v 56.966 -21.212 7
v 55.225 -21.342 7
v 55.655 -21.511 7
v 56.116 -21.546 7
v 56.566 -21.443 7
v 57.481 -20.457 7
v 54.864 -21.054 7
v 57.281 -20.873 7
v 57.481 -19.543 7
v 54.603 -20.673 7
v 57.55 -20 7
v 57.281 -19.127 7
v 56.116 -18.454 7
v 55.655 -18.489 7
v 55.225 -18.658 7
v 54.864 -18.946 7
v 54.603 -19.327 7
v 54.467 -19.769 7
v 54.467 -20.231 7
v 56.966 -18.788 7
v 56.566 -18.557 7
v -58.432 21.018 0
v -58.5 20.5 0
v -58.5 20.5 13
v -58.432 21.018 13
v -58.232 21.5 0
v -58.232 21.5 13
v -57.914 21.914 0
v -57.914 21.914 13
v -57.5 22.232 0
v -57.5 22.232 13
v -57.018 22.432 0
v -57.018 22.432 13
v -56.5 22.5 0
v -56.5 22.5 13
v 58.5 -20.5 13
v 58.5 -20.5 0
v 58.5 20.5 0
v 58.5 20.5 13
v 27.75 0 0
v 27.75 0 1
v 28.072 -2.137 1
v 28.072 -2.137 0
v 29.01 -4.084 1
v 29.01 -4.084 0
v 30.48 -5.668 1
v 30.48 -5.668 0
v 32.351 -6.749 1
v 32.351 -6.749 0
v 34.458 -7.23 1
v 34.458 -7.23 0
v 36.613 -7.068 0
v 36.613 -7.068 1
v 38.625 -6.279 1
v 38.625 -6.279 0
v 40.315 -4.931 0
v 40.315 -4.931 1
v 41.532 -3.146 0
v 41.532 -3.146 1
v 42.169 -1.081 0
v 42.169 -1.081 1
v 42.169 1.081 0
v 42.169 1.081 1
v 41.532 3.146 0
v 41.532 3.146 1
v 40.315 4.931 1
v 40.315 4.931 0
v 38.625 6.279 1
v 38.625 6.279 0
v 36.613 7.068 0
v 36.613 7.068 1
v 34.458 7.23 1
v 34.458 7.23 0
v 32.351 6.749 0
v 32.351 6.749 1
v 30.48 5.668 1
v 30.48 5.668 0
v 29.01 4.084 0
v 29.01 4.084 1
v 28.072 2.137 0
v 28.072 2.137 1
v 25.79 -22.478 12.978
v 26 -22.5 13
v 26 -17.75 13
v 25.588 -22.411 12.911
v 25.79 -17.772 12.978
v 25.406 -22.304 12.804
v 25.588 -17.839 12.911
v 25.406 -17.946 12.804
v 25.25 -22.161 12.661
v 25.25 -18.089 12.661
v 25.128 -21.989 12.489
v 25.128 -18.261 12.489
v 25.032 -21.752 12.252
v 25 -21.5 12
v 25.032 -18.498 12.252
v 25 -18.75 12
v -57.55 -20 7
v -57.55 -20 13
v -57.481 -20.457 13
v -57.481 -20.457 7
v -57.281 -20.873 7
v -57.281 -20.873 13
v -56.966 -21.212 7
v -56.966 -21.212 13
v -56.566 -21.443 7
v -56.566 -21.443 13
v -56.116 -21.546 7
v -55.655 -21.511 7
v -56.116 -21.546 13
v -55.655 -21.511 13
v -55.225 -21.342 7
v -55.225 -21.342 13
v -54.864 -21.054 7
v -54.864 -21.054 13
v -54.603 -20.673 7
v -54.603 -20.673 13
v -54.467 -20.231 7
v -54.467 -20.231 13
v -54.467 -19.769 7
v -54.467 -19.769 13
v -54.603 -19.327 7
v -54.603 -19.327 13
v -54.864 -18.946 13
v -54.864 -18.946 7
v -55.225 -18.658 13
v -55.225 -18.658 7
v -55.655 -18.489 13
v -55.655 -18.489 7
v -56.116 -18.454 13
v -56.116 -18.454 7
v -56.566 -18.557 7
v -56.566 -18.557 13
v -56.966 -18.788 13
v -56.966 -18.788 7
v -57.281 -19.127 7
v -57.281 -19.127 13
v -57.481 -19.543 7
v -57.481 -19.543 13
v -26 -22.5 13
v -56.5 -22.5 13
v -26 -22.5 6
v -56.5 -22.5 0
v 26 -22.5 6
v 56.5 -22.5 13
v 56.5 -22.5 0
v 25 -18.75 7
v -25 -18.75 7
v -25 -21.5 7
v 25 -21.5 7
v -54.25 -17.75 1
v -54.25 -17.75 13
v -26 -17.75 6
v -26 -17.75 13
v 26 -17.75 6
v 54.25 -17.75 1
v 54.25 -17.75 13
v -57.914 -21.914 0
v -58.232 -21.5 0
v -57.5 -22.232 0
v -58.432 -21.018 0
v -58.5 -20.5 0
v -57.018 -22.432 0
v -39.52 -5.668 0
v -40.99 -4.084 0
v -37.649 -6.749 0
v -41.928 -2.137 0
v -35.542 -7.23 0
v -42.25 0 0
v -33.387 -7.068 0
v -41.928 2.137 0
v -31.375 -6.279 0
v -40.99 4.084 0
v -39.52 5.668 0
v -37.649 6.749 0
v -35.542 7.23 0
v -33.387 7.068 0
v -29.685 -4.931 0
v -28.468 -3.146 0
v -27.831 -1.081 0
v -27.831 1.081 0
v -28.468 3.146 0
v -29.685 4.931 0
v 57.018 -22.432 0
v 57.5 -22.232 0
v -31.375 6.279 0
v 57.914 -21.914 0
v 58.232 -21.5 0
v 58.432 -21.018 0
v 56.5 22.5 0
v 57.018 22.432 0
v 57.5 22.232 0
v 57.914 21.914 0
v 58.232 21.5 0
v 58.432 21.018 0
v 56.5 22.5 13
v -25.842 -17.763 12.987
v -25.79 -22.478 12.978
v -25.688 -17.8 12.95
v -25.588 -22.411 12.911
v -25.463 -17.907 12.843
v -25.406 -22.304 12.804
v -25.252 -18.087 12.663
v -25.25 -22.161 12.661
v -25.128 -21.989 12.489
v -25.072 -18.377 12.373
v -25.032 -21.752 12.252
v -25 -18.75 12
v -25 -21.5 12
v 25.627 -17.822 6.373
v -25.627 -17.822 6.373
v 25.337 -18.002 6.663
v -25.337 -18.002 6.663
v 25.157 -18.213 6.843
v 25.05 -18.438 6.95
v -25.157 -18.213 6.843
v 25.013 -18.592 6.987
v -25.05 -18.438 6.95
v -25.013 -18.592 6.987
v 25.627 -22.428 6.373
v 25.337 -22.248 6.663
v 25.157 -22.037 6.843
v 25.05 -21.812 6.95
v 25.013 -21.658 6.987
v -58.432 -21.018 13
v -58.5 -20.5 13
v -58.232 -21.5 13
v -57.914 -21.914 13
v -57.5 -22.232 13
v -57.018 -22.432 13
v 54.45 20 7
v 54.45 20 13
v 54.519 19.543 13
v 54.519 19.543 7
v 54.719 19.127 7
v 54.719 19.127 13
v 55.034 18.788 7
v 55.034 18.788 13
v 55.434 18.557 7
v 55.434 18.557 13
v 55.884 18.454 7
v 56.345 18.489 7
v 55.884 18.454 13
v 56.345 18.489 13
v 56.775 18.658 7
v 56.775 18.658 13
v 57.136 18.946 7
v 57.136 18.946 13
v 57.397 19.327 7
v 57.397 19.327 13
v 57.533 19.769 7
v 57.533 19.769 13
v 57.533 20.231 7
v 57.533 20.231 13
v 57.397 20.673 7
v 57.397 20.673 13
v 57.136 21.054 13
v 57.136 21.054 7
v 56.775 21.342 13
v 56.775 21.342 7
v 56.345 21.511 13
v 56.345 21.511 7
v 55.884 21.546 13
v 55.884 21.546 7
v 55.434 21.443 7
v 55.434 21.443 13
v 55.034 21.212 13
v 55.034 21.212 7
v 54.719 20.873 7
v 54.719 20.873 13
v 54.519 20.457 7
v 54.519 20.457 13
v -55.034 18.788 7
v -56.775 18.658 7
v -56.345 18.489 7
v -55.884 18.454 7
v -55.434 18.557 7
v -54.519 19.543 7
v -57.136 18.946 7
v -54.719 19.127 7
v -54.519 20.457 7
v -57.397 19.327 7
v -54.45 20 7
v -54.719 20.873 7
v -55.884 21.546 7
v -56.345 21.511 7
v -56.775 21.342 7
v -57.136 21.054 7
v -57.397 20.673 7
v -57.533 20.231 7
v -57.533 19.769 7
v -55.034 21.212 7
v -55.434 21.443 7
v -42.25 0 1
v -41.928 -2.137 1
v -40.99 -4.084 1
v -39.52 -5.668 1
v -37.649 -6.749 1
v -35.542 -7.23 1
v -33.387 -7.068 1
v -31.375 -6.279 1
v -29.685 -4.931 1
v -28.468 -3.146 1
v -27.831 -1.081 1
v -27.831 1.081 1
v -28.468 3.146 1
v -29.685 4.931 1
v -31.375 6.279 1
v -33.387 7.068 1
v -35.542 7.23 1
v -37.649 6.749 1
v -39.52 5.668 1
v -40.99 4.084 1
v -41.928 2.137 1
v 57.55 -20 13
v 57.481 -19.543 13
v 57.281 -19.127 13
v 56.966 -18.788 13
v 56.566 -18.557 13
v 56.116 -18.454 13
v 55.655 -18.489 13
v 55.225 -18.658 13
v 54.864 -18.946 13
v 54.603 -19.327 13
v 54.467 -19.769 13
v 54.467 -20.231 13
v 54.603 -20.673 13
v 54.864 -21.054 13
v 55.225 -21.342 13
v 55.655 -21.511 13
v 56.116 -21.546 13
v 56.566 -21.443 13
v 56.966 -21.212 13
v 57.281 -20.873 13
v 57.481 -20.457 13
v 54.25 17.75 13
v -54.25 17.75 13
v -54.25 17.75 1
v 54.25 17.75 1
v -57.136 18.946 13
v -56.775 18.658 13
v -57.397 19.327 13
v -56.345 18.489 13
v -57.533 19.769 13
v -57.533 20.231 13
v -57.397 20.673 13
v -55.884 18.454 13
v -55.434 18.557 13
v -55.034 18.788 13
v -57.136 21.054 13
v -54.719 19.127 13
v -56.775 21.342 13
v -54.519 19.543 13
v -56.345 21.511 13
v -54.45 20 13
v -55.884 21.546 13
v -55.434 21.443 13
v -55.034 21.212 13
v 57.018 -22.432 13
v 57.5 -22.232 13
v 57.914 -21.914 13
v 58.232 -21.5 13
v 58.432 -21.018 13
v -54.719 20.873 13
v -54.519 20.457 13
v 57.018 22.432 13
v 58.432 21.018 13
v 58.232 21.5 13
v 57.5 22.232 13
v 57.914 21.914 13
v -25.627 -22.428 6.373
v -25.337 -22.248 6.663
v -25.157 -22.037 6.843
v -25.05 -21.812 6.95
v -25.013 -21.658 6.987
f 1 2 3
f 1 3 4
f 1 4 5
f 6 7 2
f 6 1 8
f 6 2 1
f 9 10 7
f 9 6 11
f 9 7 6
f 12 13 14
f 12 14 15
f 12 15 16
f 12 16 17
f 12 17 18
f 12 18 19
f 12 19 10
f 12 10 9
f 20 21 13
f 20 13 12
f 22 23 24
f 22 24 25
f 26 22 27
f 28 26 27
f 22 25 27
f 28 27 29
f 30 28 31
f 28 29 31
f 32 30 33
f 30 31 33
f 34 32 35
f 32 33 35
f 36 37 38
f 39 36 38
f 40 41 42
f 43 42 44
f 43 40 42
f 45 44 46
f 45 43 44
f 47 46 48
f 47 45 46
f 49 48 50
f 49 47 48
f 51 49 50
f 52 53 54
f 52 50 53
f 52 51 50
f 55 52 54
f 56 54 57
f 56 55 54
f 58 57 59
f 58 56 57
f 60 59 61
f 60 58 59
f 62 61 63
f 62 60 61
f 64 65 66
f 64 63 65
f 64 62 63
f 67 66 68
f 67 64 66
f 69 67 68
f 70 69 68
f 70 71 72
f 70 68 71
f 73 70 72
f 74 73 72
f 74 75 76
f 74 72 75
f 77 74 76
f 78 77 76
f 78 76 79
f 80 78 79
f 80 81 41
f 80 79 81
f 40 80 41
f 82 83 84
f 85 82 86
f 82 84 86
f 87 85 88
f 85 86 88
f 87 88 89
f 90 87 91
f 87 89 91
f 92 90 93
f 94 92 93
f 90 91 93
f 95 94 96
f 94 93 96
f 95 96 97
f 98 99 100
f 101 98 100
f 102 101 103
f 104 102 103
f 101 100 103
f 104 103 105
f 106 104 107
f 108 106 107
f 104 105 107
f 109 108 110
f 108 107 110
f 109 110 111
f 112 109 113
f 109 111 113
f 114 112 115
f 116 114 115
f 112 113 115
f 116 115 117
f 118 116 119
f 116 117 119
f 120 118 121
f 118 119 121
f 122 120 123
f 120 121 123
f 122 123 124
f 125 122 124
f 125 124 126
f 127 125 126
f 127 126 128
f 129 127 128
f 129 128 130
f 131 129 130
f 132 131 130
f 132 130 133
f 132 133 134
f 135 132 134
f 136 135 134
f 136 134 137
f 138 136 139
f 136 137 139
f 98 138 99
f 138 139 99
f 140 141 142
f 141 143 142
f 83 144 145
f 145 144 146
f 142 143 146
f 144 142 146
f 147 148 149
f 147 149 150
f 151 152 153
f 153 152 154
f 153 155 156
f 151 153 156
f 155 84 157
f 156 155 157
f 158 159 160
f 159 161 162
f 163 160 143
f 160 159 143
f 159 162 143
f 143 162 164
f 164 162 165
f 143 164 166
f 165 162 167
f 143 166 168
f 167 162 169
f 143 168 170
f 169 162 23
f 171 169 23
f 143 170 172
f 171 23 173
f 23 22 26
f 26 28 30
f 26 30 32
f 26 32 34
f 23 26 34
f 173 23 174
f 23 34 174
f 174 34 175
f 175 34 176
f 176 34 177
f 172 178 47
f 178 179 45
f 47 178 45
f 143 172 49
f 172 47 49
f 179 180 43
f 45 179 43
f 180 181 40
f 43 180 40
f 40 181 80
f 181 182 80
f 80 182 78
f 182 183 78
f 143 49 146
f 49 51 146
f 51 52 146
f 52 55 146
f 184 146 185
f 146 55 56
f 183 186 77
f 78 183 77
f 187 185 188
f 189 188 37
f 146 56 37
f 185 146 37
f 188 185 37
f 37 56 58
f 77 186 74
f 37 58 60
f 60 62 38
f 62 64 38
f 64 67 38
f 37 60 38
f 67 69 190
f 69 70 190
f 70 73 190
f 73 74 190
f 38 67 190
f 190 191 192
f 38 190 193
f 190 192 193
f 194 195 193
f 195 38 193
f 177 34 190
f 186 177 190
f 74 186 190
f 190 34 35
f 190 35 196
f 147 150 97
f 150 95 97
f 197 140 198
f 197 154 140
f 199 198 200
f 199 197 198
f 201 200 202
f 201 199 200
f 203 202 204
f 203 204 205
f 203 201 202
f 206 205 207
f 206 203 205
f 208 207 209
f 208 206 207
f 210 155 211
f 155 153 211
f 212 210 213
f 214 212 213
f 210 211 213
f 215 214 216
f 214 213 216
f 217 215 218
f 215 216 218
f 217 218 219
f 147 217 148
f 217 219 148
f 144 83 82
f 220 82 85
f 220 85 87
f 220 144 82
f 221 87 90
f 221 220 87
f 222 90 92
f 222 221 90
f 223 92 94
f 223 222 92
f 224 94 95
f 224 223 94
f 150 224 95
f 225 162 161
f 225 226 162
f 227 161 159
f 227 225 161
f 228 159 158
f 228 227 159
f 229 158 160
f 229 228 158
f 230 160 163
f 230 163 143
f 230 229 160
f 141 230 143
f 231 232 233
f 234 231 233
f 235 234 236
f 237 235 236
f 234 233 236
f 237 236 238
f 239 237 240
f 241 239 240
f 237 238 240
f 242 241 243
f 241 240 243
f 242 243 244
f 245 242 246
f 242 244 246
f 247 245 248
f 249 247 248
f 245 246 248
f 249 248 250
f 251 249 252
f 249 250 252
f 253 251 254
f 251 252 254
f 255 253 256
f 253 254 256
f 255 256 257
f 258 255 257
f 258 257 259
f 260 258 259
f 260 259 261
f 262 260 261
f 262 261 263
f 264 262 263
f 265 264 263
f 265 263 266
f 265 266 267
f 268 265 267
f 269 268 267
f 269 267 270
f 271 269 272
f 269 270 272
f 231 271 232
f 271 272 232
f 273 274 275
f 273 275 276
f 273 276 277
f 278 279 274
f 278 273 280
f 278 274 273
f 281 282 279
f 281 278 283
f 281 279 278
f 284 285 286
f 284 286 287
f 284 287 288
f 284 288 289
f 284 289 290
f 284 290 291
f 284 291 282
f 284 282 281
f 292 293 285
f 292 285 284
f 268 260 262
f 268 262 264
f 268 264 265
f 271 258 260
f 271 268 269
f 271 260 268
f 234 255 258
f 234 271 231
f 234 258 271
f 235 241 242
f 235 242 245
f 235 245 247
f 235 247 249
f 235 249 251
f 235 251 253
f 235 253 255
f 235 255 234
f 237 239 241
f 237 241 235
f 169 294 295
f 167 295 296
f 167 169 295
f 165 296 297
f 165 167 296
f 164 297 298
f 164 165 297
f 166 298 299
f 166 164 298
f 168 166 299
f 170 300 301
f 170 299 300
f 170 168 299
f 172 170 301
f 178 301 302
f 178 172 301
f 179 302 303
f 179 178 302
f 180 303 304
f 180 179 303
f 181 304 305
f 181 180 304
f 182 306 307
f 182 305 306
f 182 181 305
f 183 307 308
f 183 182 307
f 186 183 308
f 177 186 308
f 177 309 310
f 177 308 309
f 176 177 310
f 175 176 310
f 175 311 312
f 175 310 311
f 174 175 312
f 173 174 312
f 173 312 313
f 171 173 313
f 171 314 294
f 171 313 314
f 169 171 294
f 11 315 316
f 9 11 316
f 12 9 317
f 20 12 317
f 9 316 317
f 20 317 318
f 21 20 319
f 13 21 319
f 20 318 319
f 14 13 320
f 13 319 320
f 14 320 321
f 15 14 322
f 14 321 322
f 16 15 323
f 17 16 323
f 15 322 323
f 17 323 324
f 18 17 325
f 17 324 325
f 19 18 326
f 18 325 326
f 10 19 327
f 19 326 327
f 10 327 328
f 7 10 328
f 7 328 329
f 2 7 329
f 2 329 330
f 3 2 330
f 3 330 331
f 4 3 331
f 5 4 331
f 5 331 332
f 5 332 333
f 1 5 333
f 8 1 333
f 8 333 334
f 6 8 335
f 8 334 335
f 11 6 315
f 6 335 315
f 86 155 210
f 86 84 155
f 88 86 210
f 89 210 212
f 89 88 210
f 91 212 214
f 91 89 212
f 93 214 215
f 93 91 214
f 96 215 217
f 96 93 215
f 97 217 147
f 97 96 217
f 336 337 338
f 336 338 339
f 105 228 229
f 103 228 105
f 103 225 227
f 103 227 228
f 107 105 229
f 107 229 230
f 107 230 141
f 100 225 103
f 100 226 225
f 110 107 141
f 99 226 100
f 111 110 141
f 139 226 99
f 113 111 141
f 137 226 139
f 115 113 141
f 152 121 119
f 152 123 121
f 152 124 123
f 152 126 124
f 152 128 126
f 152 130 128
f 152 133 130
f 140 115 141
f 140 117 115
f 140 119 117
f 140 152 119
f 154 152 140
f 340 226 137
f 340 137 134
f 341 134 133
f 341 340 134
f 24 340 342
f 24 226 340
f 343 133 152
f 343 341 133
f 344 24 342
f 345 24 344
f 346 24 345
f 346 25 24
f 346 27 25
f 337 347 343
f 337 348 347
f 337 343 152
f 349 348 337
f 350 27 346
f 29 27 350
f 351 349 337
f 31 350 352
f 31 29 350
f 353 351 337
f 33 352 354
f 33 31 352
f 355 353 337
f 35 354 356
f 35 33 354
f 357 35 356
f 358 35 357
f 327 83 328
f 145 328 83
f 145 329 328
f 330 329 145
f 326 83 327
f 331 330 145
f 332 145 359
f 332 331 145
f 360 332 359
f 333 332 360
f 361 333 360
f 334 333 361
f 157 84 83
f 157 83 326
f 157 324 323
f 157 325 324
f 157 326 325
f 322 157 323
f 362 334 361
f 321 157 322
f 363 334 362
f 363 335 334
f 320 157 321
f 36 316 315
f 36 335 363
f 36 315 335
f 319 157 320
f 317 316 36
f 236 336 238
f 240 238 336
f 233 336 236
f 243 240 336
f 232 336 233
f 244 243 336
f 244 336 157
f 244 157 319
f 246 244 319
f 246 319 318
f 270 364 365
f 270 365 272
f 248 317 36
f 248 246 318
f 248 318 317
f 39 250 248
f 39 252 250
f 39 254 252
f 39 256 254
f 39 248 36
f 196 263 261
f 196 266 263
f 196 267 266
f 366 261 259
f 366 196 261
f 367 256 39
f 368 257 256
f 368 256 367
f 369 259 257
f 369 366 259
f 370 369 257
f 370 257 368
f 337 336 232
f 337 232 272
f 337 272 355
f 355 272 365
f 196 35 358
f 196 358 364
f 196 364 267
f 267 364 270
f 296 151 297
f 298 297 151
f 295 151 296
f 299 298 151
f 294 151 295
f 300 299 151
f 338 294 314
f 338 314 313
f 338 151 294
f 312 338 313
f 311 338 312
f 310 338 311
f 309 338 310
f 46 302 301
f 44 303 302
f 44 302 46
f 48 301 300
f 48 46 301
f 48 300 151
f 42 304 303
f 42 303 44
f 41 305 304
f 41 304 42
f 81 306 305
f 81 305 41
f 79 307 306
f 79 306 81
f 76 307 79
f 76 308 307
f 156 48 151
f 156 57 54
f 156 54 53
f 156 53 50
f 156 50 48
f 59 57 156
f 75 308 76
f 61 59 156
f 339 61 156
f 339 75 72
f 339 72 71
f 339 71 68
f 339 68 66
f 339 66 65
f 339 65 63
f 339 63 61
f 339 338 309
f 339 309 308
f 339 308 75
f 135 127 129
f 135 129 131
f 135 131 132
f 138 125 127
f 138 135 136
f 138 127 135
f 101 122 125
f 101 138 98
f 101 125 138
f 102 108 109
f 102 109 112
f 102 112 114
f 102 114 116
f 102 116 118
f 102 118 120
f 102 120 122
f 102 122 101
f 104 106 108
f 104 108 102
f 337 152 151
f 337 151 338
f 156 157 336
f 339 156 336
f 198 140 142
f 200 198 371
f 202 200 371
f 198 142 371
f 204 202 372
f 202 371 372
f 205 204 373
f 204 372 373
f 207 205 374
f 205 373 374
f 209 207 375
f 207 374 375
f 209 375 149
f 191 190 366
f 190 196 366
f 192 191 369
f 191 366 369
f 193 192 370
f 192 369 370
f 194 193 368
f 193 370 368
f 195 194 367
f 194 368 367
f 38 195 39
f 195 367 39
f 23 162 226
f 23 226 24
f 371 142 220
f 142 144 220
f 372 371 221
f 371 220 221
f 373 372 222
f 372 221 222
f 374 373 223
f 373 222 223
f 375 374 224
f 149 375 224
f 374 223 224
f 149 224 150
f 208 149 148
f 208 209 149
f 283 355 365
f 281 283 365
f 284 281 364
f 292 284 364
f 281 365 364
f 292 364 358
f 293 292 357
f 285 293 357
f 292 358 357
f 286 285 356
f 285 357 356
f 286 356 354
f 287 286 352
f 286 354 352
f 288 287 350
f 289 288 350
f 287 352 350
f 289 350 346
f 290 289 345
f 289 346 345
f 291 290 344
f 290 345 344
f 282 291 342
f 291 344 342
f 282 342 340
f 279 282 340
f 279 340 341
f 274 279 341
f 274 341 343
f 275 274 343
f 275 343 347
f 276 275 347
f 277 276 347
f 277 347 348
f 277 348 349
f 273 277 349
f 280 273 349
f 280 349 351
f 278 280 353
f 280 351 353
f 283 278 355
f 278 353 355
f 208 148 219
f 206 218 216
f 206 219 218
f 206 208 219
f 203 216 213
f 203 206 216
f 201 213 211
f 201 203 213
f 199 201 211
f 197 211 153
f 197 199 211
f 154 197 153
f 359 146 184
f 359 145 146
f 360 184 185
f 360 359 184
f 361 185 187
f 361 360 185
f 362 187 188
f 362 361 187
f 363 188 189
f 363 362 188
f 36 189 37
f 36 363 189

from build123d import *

# Parameters (mm, degrees)
SKETCH_1_W          = 117
SKETCH_1_H          = 45
SKETCH_1_R          = 7.25
EXTRUDE_1_DEPTH     = 13
SKETCH_2_W          = 108.5
SKETCH_2_H          = 35.5
CUT_EXTRUDE_1_DEPTH = 12
SKETCH_3_R          = 1.55
CUT_EXTRUDE_2_DEPTH = 6
SKETCH_4_W          = 50
SKETCH_4_H          = 10.556130204
CUT_EXTRUDE_3_DEPTH = 6
FILLET_1_R          = 2
FILLET_2_R          = 1


with BuildPart() as part:
    # 草图1 → 凸台-拉伸1 (new body)
    with BuildSketch(Plane.XY):
        Rectangle(SKETCH_1_W, SKETCH_1_H)
        with Locations(Location((-35, 0, 0), (0, 0, 180))):
            Circle(SKETCH_1_R, mode=Mode.SUBTRACT)
        with Locations(Location((35, 0, 0), (0, 0, 180))):
            Circle(SKETCH_1_R, mode=Mode.SUBTRACT)
    extrude(amount=EXTRUDE_1_DEPTH)

    # 草图2 → 切除-拉伸1 (cut)
    with BuildSketch(Plane.XY.offset(13)):
        Rectangle(SKETCH_2_W, SKETCH_2_H)
    extrude(amount=-CUT_EXTRUDE_1_DEPTH, mode=Mode.SUBTRACT)

    # 草图3 → 切除-拉伸2 (cut)
    with BuildSketch(Plane.XY.offset(13)):
        with Locations((-56, 20)):
            Circle(SKETCH_3_R)
        with Locations(Location((-56, -20, 0), (0, 0, 180))):
            Circle(SKETCH_3_R)
        with Locations((56, -20)):
            Circle(SKETCH_3_R)
        with Locations(Location((56, 20, 0), (0, 0, 180))):
            Circle(SKETCH_3_R)
    extrude(amount=-CUT_EXTRUDE_2_DEPTH, mode=Mode.SUBTRACT)

    # 草图4 → 切除-拉伸3 (cut)
    with BuildSketch(Plane.XY.offset(13)):
        with Locations((0, -20)):
            Rectangle(SKETCH_4_W, SKETCH_4_H)
    extrude(amount=-CUT_EXTRUDE_3_DEPTH, mode=Mode.SUBTRACT)

    # 圆角1
    fillet_1_edges = [part.edges().sort_by_distance(p)[0] for p in [
        (58.5, -22.5, 6.5),
        (-58.5, -22.5, 6.5),
        (-58.5, 22.5, 6.5),
        (58.5, 22.5, 6.5),
    ]]
    fillet(fillet_1_edges, radius=FILLET_1_R)

    # 圆角2
    fillet_2_edges = [part.edges().sort_by_distance(p)[0] for p in [
        (0, -17.75, 7),
        (25, -17.75, 10),
        (-25, -17.75, 10),
        (-25, -22.5, 10),
        (25, -22.5, 10),
        (0, -22.5, 7),
        (-25, -20.125, 13),
        (25, -20.125, 13),
    ]]
    fillet(fillet_2_edges, radius=FILLET_2_R)


solid = part.part
